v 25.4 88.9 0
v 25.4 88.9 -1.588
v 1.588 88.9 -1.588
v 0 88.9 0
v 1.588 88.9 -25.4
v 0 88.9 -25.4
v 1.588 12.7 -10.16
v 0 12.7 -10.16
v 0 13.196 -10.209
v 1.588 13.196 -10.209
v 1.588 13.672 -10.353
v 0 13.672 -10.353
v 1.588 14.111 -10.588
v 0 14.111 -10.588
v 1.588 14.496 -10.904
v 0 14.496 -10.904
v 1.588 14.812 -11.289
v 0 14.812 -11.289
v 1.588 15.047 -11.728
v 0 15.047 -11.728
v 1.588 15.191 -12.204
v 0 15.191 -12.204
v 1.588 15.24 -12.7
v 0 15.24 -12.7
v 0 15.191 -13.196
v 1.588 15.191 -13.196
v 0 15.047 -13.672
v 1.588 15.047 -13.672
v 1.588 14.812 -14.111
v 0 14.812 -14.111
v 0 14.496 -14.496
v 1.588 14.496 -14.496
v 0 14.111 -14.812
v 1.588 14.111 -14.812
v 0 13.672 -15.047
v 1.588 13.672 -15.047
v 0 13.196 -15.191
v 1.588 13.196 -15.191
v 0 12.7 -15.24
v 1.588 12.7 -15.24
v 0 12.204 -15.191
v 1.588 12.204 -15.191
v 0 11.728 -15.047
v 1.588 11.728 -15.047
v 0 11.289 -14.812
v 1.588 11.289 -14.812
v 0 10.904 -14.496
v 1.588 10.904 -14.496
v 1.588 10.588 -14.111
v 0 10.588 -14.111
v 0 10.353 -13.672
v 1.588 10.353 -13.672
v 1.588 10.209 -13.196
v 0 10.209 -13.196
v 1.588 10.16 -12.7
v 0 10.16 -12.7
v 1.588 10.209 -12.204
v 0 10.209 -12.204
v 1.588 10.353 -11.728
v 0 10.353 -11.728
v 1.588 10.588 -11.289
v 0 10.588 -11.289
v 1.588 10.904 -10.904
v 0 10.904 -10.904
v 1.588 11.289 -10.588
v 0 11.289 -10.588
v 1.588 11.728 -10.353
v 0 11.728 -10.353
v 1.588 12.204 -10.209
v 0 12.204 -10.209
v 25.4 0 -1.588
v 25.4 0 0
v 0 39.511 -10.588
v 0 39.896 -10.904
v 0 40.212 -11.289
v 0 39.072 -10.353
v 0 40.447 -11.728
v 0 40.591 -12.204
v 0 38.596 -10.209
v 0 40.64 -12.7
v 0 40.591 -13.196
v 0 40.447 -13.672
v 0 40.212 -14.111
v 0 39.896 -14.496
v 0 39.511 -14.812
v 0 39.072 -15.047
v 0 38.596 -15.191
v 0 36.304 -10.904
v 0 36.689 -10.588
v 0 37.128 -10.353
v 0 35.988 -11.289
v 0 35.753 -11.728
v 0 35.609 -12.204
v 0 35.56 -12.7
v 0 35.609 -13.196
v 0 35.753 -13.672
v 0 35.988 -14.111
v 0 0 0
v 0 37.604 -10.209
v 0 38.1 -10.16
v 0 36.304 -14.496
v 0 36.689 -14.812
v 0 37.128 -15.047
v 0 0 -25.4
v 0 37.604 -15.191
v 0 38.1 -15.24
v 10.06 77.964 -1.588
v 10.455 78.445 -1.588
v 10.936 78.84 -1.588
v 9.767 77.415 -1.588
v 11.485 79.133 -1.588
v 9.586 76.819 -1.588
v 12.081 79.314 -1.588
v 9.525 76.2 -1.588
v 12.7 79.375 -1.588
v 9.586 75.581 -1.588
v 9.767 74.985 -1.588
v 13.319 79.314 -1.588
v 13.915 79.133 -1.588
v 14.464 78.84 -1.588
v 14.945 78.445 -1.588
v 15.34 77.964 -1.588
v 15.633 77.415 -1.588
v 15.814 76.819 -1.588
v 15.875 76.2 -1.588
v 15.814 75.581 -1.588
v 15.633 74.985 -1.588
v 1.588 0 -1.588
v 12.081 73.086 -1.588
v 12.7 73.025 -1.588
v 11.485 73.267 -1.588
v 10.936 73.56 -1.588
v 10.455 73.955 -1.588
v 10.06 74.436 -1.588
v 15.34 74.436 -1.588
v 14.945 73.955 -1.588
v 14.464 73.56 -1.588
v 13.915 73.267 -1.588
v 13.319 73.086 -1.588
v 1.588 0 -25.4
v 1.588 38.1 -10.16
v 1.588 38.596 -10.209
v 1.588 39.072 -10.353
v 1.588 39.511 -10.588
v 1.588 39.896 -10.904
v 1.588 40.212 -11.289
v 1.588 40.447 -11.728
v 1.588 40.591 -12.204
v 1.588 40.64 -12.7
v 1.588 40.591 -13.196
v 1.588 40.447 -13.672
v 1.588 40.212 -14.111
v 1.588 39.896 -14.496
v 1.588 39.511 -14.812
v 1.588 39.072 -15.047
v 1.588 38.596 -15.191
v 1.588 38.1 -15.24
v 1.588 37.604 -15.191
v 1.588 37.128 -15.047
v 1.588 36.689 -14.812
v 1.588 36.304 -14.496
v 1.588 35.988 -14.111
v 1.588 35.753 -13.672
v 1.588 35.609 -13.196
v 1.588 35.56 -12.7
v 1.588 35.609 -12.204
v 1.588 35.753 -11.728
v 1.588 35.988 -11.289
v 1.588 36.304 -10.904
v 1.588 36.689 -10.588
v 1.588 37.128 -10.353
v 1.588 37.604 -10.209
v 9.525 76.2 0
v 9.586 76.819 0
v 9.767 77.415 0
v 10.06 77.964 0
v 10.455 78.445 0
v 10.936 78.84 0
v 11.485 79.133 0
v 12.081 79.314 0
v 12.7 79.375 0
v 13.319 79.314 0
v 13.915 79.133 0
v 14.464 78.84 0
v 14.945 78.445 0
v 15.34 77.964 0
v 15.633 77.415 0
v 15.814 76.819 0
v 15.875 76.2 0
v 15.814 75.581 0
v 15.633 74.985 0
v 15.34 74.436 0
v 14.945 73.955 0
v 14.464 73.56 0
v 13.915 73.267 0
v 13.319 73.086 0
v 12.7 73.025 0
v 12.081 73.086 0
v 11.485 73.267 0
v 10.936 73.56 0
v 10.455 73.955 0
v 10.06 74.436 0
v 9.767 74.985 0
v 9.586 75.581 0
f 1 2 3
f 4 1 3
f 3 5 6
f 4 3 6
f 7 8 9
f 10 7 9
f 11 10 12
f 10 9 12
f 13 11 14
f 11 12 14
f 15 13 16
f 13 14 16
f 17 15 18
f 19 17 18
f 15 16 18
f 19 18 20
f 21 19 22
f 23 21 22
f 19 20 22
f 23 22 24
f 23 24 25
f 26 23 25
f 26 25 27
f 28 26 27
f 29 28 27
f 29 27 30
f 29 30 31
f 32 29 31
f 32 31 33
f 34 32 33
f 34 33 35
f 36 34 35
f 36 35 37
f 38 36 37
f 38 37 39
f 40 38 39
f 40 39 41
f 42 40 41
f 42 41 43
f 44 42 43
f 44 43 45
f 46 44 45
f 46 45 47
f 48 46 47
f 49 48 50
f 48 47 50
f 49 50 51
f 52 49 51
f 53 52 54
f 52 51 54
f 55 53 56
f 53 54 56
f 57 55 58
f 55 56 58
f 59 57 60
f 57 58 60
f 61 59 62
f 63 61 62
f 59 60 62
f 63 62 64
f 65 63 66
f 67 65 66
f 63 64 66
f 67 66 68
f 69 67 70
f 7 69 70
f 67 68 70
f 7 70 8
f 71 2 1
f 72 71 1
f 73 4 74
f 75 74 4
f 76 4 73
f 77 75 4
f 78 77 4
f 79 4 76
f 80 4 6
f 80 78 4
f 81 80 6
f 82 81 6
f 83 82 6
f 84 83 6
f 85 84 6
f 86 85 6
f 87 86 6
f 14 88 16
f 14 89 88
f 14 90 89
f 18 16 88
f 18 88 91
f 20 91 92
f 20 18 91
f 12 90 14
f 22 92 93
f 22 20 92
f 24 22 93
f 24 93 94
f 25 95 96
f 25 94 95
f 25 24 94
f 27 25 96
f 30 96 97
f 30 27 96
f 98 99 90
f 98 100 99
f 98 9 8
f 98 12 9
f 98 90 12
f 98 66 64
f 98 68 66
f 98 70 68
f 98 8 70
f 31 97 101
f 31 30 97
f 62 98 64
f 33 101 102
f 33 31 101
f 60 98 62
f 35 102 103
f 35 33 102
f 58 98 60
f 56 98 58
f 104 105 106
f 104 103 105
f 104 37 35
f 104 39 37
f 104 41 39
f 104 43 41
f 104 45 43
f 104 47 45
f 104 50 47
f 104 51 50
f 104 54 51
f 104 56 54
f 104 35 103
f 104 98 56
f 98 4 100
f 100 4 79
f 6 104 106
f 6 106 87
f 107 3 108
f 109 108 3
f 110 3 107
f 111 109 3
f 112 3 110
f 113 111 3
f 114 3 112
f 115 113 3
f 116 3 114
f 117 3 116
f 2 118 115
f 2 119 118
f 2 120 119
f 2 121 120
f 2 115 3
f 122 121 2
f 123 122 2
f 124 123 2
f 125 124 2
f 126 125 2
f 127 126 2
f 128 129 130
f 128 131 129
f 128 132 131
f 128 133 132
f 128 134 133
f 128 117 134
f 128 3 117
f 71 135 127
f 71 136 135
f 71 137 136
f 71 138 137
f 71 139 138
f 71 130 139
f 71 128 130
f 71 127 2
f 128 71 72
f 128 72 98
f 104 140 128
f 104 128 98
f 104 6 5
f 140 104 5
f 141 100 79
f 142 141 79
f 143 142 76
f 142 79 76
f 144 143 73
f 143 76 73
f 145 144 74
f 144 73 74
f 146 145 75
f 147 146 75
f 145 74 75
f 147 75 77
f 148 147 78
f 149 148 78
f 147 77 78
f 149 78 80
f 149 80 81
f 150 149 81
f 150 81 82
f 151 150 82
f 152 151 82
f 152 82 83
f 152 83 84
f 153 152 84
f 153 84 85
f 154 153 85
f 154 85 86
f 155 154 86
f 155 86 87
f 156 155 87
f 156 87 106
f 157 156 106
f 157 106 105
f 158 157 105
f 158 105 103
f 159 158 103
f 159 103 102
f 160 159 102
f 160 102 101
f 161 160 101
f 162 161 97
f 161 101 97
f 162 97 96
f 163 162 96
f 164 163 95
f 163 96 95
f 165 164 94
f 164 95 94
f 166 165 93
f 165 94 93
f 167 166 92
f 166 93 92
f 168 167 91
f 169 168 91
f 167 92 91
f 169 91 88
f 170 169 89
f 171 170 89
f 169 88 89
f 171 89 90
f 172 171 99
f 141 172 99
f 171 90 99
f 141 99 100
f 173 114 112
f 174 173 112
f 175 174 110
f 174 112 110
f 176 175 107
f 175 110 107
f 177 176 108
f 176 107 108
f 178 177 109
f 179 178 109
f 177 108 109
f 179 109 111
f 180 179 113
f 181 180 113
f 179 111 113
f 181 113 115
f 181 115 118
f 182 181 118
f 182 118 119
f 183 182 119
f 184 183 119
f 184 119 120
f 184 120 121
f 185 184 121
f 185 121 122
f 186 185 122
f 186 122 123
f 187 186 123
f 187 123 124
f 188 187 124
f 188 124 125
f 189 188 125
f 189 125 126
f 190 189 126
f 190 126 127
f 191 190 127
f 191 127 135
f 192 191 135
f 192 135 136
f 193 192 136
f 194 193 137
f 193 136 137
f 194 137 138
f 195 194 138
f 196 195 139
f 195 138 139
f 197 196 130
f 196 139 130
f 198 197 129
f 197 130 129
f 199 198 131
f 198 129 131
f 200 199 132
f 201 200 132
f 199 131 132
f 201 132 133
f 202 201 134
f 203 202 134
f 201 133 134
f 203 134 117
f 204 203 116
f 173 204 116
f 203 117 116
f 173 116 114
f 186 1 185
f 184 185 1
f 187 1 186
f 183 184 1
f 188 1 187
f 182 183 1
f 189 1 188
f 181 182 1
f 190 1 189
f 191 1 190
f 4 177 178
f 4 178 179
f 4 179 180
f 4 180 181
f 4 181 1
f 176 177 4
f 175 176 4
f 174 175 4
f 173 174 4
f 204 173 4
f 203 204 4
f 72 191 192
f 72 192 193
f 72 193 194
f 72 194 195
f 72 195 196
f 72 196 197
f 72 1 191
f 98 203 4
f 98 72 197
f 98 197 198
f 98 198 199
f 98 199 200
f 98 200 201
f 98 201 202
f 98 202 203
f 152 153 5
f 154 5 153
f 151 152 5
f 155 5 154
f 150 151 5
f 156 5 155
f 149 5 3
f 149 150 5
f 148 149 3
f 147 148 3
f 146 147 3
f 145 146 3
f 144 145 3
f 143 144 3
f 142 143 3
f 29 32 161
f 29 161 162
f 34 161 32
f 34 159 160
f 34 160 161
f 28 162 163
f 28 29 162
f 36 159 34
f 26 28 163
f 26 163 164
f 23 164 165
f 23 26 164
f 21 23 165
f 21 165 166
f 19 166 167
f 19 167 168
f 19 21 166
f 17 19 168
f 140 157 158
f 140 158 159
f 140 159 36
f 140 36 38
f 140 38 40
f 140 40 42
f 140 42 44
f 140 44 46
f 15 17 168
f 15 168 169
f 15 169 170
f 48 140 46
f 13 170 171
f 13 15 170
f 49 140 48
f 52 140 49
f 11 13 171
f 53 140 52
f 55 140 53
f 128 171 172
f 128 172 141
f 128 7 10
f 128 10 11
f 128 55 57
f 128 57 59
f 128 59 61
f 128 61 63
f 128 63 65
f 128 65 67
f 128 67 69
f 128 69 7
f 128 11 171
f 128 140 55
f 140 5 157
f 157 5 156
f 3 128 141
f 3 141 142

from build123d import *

# Parameters (mm, degrees)
BOSS_EXTRUDE1_DEPTH = 88.9
SKETCH2_R           = 2.54
CUT_EXTRUDE1_DEPTH  = 88.9
SKETCH3_R           = 3.175
CUT_EXTRUDE2_DEPTH  = 88.9


with BuildPart() as part:
    # Sketch1 → Boss-Extrude1 (new body)
    with BuildSketch(Plane(origin=(0, 0, 0), x_dir=(1, 0, 0), z_dir=(0, 1, 0))):
        Polygon((0, 0), (0, 25.4), (1.5875, 25.4), (1.5875, 1.5875), (25.4, 1.5875), (25.4, 0), align=None)
    extrude(amount=BOSS_EXTRUDE1_DEPTH)

    # Sketch2 → Cut-Extrude1 (cut)
    with BuildSketch(Plane.ZY):
        with Locations((-12.7, 38.1)):
            Circle(SKETCH2_R)
        with Locations((-12.7, 12.7)):
            Circle(SKETCH2_R)
    extrude(amount=-CUT_EXTRUDE1_DEPTH, mode=Mode.SUBTRACT)

    # Sketch3 → Cut-Extrude2 (cut)
    with BuildSketch(Plane(origin=(0, 0, -1.5875), x_dir=(-1, 0, 0), z_dir=(0, 0, -1))):
        with Locations((-12.7, 76.2)):
            Circle(SKETCH3_R)
    extrude(amount=-CUT_EXTRUDE2_DEPTH, mode=Mode.SUBTRACT)


solid = part.part
